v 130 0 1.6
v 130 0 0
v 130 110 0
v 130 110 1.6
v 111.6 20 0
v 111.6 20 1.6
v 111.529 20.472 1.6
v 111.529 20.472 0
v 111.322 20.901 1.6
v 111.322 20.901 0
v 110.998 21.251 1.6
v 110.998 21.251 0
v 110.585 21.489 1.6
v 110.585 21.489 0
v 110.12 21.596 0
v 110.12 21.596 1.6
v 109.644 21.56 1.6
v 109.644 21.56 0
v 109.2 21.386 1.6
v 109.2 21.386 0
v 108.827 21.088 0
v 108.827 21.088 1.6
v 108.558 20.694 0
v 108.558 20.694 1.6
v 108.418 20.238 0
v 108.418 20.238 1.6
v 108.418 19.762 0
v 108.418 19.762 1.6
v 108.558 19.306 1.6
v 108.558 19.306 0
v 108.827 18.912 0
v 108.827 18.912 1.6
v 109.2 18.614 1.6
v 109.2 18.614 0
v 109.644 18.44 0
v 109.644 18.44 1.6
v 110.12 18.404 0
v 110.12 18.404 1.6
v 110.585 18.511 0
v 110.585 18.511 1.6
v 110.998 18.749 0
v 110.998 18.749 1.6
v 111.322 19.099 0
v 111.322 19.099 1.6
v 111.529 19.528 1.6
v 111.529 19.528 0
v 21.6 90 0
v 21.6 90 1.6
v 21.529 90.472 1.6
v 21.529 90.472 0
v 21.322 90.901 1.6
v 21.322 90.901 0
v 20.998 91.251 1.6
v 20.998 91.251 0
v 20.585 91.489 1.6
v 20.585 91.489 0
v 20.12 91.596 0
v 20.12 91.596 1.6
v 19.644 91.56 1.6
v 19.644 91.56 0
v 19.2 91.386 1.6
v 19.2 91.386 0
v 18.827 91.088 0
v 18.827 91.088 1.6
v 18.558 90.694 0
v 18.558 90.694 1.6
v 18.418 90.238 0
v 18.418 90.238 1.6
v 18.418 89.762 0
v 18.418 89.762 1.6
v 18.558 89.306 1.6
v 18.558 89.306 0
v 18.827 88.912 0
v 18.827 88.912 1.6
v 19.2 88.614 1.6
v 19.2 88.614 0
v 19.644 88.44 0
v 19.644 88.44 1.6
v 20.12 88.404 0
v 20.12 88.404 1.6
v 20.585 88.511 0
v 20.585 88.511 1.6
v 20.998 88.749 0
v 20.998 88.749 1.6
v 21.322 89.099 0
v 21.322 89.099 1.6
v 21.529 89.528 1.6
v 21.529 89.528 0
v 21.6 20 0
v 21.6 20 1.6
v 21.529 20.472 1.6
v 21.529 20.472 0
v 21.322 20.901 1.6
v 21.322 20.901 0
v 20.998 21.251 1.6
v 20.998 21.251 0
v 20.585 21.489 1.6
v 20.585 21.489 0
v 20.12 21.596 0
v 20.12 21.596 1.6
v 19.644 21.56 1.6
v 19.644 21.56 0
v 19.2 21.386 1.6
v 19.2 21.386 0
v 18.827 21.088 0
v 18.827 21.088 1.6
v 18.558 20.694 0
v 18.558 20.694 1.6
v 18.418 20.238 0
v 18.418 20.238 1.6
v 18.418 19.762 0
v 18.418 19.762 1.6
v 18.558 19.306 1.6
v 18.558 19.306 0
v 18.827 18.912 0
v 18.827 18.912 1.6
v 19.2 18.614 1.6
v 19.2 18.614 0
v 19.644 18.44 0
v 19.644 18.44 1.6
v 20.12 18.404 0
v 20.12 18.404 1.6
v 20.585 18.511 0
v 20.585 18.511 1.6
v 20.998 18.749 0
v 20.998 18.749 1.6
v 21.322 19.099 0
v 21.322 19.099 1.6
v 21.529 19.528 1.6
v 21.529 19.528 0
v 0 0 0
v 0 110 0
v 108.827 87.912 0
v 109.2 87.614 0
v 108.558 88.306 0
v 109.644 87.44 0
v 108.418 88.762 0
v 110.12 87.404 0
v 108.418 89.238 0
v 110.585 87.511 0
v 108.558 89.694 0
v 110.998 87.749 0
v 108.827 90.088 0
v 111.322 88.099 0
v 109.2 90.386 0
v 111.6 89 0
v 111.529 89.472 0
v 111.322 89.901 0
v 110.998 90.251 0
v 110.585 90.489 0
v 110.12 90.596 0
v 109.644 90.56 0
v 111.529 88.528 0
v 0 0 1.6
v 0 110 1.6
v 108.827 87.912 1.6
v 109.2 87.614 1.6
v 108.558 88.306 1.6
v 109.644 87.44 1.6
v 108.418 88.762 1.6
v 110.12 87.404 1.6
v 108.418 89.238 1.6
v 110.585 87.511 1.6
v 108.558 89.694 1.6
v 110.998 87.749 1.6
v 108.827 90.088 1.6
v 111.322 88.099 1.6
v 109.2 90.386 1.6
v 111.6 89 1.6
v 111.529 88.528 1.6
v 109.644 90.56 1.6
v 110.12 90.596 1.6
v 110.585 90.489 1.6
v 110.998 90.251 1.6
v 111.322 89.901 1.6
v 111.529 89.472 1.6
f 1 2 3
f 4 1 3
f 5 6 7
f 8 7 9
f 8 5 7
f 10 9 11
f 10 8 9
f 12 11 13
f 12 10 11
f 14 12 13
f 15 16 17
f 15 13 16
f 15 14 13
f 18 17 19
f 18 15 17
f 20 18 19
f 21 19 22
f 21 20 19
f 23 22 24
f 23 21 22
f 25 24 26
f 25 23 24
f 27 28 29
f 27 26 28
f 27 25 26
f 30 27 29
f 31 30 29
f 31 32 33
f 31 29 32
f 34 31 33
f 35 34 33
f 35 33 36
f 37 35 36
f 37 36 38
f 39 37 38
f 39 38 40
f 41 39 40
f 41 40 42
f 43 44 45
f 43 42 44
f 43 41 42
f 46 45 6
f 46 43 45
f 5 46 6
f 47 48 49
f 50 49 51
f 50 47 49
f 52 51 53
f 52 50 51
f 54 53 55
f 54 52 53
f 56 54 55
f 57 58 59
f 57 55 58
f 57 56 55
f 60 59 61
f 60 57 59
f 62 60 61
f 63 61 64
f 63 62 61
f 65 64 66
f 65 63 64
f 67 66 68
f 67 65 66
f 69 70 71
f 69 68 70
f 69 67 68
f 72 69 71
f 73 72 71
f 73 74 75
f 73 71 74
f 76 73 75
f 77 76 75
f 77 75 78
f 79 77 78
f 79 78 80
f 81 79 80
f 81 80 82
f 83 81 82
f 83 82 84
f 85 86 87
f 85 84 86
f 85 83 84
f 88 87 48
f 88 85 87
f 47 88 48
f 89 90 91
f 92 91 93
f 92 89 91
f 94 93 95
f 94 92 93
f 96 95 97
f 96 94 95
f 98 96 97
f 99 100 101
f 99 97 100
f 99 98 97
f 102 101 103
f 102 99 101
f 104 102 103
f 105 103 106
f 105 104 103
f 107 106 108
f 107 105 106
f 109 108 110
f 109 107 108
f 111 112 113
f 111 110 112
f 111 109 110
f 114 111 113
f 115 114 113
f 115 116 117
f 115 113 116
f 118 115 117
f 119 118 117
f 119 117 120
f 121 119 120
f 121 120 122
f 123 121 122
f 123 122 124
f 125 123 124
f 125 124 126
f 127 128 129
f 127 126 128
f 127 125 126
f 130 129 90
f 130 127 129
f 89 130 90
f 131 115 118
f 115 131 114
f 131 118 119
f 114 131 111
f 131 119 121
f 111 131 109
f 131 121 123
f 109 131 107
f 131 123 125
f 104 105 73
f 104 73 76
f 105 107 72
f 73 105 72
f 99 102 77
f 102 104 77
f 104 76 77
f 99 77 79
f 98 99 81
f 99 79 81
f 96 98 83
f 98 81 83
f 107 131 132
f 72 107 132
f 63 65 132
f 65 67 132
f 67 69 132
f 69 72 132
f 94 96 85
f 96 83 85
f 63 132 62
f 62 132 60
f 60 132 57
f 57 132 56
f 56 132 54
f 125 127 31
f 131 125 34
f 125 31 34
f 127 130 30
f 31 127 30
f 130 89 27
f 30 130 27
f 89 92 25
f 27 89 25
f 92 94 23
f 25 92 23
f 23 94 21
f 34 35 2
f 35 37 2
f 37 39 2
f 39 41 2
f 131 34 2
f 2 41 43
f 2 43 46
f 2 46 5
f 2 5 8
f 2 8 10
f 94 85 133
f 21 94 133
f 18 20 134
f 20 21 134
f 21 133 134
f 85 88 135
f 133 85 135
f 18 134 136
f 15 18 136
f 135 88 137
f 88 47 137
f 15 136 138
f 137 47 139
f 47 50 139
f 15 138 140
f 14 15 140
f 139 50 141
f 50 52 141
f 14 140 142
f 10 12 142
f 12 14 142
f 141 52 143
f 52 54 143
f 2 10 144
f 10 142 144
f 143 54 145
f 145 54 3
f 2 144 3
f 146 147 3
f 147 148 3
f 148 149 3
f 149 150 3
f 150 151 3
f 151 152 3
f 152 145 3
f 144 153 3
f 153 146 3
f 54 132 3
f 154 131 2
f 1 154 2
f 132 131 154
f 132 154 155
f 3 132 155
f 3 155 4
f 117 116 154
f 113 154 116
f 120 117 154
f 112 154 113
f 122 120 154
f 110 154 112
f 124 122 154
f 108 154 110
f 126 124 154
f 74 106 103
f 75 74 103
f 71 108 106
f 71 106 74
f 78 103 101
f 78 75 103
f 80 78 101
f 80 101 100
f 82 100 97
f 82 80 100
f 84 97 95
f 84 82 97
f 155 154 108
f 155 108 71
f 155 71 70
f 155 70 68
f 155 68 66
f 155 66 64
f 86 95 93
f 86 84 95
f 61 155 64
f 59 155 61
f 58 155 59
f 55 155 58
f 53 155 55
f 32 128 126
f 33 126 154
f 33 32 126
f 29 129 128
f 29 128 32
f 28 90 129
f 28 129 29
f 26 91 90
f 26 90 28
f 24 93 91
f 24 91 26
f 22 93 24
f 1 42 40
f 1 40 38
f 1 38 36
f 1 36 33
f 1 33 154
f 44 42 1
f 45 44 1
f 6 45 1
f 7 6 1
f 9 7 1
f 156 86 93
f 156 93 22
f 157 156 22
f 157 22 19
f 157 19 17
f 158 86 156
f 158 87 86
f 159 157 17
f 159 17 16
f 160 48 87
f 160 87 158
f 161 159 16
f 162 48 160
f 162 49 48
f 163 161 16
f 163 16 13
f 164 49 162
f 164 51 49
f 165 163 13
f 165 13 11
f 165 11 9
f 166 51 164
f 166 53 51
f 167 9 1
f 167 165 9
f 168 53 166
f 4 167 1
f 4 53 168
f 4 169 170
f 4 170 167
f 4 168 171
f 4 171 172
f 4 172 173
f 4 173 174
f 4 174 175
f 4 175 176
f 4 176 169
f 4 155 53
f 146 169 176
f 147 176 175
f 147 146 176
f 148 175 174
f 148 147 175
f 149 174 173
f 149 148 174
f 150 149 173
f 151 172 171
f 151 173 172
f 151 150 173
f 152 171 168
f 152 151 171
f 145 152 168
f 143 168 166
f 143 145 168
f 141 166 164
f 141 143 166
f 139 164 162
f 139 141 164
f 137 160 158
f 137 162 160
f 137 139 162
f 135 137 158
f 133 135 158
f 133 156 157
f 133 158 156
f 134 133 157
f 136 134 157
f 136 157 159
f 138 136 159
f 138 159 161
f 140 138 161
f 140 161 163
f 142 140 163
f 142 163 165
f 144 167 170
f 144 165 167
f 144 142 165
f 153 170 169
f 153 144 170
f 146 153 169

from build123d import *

# Parameters (mm, degrees)
SKETCH_W     = 130
SKETCH_H     = 110
PAD_DEPTH    = 1.6
SKETCH001_R  = 1.6
POCKET_DEPTH = 5


with BuildPart() as part:
    # Sketch → Pad (new body)
    with BuildSketch(Plane.XY):
        with Locations((65, 55)):
            Rectangle(SKETCH_W, SKETCH_H)
    extrude(amount=PAD_DEPTH)

    # Sketch001 → Pocket (cut)
    with BuildSketch(Plane.XY):
        with Locations((20, 20)):
            Circle(SKETCH001_R)
        with Locations((110, 89)):
            Circle(SKETCH001_R)
        with Locations((20, 90)):
            Circle(SKETCH001_R)
        with Locations((110, 20)):
            Circle(SKETCH001_R)
    extrude(amount=POCKET_DEPTH, mode=Mode.SUBTRACT)


solid = part.part
